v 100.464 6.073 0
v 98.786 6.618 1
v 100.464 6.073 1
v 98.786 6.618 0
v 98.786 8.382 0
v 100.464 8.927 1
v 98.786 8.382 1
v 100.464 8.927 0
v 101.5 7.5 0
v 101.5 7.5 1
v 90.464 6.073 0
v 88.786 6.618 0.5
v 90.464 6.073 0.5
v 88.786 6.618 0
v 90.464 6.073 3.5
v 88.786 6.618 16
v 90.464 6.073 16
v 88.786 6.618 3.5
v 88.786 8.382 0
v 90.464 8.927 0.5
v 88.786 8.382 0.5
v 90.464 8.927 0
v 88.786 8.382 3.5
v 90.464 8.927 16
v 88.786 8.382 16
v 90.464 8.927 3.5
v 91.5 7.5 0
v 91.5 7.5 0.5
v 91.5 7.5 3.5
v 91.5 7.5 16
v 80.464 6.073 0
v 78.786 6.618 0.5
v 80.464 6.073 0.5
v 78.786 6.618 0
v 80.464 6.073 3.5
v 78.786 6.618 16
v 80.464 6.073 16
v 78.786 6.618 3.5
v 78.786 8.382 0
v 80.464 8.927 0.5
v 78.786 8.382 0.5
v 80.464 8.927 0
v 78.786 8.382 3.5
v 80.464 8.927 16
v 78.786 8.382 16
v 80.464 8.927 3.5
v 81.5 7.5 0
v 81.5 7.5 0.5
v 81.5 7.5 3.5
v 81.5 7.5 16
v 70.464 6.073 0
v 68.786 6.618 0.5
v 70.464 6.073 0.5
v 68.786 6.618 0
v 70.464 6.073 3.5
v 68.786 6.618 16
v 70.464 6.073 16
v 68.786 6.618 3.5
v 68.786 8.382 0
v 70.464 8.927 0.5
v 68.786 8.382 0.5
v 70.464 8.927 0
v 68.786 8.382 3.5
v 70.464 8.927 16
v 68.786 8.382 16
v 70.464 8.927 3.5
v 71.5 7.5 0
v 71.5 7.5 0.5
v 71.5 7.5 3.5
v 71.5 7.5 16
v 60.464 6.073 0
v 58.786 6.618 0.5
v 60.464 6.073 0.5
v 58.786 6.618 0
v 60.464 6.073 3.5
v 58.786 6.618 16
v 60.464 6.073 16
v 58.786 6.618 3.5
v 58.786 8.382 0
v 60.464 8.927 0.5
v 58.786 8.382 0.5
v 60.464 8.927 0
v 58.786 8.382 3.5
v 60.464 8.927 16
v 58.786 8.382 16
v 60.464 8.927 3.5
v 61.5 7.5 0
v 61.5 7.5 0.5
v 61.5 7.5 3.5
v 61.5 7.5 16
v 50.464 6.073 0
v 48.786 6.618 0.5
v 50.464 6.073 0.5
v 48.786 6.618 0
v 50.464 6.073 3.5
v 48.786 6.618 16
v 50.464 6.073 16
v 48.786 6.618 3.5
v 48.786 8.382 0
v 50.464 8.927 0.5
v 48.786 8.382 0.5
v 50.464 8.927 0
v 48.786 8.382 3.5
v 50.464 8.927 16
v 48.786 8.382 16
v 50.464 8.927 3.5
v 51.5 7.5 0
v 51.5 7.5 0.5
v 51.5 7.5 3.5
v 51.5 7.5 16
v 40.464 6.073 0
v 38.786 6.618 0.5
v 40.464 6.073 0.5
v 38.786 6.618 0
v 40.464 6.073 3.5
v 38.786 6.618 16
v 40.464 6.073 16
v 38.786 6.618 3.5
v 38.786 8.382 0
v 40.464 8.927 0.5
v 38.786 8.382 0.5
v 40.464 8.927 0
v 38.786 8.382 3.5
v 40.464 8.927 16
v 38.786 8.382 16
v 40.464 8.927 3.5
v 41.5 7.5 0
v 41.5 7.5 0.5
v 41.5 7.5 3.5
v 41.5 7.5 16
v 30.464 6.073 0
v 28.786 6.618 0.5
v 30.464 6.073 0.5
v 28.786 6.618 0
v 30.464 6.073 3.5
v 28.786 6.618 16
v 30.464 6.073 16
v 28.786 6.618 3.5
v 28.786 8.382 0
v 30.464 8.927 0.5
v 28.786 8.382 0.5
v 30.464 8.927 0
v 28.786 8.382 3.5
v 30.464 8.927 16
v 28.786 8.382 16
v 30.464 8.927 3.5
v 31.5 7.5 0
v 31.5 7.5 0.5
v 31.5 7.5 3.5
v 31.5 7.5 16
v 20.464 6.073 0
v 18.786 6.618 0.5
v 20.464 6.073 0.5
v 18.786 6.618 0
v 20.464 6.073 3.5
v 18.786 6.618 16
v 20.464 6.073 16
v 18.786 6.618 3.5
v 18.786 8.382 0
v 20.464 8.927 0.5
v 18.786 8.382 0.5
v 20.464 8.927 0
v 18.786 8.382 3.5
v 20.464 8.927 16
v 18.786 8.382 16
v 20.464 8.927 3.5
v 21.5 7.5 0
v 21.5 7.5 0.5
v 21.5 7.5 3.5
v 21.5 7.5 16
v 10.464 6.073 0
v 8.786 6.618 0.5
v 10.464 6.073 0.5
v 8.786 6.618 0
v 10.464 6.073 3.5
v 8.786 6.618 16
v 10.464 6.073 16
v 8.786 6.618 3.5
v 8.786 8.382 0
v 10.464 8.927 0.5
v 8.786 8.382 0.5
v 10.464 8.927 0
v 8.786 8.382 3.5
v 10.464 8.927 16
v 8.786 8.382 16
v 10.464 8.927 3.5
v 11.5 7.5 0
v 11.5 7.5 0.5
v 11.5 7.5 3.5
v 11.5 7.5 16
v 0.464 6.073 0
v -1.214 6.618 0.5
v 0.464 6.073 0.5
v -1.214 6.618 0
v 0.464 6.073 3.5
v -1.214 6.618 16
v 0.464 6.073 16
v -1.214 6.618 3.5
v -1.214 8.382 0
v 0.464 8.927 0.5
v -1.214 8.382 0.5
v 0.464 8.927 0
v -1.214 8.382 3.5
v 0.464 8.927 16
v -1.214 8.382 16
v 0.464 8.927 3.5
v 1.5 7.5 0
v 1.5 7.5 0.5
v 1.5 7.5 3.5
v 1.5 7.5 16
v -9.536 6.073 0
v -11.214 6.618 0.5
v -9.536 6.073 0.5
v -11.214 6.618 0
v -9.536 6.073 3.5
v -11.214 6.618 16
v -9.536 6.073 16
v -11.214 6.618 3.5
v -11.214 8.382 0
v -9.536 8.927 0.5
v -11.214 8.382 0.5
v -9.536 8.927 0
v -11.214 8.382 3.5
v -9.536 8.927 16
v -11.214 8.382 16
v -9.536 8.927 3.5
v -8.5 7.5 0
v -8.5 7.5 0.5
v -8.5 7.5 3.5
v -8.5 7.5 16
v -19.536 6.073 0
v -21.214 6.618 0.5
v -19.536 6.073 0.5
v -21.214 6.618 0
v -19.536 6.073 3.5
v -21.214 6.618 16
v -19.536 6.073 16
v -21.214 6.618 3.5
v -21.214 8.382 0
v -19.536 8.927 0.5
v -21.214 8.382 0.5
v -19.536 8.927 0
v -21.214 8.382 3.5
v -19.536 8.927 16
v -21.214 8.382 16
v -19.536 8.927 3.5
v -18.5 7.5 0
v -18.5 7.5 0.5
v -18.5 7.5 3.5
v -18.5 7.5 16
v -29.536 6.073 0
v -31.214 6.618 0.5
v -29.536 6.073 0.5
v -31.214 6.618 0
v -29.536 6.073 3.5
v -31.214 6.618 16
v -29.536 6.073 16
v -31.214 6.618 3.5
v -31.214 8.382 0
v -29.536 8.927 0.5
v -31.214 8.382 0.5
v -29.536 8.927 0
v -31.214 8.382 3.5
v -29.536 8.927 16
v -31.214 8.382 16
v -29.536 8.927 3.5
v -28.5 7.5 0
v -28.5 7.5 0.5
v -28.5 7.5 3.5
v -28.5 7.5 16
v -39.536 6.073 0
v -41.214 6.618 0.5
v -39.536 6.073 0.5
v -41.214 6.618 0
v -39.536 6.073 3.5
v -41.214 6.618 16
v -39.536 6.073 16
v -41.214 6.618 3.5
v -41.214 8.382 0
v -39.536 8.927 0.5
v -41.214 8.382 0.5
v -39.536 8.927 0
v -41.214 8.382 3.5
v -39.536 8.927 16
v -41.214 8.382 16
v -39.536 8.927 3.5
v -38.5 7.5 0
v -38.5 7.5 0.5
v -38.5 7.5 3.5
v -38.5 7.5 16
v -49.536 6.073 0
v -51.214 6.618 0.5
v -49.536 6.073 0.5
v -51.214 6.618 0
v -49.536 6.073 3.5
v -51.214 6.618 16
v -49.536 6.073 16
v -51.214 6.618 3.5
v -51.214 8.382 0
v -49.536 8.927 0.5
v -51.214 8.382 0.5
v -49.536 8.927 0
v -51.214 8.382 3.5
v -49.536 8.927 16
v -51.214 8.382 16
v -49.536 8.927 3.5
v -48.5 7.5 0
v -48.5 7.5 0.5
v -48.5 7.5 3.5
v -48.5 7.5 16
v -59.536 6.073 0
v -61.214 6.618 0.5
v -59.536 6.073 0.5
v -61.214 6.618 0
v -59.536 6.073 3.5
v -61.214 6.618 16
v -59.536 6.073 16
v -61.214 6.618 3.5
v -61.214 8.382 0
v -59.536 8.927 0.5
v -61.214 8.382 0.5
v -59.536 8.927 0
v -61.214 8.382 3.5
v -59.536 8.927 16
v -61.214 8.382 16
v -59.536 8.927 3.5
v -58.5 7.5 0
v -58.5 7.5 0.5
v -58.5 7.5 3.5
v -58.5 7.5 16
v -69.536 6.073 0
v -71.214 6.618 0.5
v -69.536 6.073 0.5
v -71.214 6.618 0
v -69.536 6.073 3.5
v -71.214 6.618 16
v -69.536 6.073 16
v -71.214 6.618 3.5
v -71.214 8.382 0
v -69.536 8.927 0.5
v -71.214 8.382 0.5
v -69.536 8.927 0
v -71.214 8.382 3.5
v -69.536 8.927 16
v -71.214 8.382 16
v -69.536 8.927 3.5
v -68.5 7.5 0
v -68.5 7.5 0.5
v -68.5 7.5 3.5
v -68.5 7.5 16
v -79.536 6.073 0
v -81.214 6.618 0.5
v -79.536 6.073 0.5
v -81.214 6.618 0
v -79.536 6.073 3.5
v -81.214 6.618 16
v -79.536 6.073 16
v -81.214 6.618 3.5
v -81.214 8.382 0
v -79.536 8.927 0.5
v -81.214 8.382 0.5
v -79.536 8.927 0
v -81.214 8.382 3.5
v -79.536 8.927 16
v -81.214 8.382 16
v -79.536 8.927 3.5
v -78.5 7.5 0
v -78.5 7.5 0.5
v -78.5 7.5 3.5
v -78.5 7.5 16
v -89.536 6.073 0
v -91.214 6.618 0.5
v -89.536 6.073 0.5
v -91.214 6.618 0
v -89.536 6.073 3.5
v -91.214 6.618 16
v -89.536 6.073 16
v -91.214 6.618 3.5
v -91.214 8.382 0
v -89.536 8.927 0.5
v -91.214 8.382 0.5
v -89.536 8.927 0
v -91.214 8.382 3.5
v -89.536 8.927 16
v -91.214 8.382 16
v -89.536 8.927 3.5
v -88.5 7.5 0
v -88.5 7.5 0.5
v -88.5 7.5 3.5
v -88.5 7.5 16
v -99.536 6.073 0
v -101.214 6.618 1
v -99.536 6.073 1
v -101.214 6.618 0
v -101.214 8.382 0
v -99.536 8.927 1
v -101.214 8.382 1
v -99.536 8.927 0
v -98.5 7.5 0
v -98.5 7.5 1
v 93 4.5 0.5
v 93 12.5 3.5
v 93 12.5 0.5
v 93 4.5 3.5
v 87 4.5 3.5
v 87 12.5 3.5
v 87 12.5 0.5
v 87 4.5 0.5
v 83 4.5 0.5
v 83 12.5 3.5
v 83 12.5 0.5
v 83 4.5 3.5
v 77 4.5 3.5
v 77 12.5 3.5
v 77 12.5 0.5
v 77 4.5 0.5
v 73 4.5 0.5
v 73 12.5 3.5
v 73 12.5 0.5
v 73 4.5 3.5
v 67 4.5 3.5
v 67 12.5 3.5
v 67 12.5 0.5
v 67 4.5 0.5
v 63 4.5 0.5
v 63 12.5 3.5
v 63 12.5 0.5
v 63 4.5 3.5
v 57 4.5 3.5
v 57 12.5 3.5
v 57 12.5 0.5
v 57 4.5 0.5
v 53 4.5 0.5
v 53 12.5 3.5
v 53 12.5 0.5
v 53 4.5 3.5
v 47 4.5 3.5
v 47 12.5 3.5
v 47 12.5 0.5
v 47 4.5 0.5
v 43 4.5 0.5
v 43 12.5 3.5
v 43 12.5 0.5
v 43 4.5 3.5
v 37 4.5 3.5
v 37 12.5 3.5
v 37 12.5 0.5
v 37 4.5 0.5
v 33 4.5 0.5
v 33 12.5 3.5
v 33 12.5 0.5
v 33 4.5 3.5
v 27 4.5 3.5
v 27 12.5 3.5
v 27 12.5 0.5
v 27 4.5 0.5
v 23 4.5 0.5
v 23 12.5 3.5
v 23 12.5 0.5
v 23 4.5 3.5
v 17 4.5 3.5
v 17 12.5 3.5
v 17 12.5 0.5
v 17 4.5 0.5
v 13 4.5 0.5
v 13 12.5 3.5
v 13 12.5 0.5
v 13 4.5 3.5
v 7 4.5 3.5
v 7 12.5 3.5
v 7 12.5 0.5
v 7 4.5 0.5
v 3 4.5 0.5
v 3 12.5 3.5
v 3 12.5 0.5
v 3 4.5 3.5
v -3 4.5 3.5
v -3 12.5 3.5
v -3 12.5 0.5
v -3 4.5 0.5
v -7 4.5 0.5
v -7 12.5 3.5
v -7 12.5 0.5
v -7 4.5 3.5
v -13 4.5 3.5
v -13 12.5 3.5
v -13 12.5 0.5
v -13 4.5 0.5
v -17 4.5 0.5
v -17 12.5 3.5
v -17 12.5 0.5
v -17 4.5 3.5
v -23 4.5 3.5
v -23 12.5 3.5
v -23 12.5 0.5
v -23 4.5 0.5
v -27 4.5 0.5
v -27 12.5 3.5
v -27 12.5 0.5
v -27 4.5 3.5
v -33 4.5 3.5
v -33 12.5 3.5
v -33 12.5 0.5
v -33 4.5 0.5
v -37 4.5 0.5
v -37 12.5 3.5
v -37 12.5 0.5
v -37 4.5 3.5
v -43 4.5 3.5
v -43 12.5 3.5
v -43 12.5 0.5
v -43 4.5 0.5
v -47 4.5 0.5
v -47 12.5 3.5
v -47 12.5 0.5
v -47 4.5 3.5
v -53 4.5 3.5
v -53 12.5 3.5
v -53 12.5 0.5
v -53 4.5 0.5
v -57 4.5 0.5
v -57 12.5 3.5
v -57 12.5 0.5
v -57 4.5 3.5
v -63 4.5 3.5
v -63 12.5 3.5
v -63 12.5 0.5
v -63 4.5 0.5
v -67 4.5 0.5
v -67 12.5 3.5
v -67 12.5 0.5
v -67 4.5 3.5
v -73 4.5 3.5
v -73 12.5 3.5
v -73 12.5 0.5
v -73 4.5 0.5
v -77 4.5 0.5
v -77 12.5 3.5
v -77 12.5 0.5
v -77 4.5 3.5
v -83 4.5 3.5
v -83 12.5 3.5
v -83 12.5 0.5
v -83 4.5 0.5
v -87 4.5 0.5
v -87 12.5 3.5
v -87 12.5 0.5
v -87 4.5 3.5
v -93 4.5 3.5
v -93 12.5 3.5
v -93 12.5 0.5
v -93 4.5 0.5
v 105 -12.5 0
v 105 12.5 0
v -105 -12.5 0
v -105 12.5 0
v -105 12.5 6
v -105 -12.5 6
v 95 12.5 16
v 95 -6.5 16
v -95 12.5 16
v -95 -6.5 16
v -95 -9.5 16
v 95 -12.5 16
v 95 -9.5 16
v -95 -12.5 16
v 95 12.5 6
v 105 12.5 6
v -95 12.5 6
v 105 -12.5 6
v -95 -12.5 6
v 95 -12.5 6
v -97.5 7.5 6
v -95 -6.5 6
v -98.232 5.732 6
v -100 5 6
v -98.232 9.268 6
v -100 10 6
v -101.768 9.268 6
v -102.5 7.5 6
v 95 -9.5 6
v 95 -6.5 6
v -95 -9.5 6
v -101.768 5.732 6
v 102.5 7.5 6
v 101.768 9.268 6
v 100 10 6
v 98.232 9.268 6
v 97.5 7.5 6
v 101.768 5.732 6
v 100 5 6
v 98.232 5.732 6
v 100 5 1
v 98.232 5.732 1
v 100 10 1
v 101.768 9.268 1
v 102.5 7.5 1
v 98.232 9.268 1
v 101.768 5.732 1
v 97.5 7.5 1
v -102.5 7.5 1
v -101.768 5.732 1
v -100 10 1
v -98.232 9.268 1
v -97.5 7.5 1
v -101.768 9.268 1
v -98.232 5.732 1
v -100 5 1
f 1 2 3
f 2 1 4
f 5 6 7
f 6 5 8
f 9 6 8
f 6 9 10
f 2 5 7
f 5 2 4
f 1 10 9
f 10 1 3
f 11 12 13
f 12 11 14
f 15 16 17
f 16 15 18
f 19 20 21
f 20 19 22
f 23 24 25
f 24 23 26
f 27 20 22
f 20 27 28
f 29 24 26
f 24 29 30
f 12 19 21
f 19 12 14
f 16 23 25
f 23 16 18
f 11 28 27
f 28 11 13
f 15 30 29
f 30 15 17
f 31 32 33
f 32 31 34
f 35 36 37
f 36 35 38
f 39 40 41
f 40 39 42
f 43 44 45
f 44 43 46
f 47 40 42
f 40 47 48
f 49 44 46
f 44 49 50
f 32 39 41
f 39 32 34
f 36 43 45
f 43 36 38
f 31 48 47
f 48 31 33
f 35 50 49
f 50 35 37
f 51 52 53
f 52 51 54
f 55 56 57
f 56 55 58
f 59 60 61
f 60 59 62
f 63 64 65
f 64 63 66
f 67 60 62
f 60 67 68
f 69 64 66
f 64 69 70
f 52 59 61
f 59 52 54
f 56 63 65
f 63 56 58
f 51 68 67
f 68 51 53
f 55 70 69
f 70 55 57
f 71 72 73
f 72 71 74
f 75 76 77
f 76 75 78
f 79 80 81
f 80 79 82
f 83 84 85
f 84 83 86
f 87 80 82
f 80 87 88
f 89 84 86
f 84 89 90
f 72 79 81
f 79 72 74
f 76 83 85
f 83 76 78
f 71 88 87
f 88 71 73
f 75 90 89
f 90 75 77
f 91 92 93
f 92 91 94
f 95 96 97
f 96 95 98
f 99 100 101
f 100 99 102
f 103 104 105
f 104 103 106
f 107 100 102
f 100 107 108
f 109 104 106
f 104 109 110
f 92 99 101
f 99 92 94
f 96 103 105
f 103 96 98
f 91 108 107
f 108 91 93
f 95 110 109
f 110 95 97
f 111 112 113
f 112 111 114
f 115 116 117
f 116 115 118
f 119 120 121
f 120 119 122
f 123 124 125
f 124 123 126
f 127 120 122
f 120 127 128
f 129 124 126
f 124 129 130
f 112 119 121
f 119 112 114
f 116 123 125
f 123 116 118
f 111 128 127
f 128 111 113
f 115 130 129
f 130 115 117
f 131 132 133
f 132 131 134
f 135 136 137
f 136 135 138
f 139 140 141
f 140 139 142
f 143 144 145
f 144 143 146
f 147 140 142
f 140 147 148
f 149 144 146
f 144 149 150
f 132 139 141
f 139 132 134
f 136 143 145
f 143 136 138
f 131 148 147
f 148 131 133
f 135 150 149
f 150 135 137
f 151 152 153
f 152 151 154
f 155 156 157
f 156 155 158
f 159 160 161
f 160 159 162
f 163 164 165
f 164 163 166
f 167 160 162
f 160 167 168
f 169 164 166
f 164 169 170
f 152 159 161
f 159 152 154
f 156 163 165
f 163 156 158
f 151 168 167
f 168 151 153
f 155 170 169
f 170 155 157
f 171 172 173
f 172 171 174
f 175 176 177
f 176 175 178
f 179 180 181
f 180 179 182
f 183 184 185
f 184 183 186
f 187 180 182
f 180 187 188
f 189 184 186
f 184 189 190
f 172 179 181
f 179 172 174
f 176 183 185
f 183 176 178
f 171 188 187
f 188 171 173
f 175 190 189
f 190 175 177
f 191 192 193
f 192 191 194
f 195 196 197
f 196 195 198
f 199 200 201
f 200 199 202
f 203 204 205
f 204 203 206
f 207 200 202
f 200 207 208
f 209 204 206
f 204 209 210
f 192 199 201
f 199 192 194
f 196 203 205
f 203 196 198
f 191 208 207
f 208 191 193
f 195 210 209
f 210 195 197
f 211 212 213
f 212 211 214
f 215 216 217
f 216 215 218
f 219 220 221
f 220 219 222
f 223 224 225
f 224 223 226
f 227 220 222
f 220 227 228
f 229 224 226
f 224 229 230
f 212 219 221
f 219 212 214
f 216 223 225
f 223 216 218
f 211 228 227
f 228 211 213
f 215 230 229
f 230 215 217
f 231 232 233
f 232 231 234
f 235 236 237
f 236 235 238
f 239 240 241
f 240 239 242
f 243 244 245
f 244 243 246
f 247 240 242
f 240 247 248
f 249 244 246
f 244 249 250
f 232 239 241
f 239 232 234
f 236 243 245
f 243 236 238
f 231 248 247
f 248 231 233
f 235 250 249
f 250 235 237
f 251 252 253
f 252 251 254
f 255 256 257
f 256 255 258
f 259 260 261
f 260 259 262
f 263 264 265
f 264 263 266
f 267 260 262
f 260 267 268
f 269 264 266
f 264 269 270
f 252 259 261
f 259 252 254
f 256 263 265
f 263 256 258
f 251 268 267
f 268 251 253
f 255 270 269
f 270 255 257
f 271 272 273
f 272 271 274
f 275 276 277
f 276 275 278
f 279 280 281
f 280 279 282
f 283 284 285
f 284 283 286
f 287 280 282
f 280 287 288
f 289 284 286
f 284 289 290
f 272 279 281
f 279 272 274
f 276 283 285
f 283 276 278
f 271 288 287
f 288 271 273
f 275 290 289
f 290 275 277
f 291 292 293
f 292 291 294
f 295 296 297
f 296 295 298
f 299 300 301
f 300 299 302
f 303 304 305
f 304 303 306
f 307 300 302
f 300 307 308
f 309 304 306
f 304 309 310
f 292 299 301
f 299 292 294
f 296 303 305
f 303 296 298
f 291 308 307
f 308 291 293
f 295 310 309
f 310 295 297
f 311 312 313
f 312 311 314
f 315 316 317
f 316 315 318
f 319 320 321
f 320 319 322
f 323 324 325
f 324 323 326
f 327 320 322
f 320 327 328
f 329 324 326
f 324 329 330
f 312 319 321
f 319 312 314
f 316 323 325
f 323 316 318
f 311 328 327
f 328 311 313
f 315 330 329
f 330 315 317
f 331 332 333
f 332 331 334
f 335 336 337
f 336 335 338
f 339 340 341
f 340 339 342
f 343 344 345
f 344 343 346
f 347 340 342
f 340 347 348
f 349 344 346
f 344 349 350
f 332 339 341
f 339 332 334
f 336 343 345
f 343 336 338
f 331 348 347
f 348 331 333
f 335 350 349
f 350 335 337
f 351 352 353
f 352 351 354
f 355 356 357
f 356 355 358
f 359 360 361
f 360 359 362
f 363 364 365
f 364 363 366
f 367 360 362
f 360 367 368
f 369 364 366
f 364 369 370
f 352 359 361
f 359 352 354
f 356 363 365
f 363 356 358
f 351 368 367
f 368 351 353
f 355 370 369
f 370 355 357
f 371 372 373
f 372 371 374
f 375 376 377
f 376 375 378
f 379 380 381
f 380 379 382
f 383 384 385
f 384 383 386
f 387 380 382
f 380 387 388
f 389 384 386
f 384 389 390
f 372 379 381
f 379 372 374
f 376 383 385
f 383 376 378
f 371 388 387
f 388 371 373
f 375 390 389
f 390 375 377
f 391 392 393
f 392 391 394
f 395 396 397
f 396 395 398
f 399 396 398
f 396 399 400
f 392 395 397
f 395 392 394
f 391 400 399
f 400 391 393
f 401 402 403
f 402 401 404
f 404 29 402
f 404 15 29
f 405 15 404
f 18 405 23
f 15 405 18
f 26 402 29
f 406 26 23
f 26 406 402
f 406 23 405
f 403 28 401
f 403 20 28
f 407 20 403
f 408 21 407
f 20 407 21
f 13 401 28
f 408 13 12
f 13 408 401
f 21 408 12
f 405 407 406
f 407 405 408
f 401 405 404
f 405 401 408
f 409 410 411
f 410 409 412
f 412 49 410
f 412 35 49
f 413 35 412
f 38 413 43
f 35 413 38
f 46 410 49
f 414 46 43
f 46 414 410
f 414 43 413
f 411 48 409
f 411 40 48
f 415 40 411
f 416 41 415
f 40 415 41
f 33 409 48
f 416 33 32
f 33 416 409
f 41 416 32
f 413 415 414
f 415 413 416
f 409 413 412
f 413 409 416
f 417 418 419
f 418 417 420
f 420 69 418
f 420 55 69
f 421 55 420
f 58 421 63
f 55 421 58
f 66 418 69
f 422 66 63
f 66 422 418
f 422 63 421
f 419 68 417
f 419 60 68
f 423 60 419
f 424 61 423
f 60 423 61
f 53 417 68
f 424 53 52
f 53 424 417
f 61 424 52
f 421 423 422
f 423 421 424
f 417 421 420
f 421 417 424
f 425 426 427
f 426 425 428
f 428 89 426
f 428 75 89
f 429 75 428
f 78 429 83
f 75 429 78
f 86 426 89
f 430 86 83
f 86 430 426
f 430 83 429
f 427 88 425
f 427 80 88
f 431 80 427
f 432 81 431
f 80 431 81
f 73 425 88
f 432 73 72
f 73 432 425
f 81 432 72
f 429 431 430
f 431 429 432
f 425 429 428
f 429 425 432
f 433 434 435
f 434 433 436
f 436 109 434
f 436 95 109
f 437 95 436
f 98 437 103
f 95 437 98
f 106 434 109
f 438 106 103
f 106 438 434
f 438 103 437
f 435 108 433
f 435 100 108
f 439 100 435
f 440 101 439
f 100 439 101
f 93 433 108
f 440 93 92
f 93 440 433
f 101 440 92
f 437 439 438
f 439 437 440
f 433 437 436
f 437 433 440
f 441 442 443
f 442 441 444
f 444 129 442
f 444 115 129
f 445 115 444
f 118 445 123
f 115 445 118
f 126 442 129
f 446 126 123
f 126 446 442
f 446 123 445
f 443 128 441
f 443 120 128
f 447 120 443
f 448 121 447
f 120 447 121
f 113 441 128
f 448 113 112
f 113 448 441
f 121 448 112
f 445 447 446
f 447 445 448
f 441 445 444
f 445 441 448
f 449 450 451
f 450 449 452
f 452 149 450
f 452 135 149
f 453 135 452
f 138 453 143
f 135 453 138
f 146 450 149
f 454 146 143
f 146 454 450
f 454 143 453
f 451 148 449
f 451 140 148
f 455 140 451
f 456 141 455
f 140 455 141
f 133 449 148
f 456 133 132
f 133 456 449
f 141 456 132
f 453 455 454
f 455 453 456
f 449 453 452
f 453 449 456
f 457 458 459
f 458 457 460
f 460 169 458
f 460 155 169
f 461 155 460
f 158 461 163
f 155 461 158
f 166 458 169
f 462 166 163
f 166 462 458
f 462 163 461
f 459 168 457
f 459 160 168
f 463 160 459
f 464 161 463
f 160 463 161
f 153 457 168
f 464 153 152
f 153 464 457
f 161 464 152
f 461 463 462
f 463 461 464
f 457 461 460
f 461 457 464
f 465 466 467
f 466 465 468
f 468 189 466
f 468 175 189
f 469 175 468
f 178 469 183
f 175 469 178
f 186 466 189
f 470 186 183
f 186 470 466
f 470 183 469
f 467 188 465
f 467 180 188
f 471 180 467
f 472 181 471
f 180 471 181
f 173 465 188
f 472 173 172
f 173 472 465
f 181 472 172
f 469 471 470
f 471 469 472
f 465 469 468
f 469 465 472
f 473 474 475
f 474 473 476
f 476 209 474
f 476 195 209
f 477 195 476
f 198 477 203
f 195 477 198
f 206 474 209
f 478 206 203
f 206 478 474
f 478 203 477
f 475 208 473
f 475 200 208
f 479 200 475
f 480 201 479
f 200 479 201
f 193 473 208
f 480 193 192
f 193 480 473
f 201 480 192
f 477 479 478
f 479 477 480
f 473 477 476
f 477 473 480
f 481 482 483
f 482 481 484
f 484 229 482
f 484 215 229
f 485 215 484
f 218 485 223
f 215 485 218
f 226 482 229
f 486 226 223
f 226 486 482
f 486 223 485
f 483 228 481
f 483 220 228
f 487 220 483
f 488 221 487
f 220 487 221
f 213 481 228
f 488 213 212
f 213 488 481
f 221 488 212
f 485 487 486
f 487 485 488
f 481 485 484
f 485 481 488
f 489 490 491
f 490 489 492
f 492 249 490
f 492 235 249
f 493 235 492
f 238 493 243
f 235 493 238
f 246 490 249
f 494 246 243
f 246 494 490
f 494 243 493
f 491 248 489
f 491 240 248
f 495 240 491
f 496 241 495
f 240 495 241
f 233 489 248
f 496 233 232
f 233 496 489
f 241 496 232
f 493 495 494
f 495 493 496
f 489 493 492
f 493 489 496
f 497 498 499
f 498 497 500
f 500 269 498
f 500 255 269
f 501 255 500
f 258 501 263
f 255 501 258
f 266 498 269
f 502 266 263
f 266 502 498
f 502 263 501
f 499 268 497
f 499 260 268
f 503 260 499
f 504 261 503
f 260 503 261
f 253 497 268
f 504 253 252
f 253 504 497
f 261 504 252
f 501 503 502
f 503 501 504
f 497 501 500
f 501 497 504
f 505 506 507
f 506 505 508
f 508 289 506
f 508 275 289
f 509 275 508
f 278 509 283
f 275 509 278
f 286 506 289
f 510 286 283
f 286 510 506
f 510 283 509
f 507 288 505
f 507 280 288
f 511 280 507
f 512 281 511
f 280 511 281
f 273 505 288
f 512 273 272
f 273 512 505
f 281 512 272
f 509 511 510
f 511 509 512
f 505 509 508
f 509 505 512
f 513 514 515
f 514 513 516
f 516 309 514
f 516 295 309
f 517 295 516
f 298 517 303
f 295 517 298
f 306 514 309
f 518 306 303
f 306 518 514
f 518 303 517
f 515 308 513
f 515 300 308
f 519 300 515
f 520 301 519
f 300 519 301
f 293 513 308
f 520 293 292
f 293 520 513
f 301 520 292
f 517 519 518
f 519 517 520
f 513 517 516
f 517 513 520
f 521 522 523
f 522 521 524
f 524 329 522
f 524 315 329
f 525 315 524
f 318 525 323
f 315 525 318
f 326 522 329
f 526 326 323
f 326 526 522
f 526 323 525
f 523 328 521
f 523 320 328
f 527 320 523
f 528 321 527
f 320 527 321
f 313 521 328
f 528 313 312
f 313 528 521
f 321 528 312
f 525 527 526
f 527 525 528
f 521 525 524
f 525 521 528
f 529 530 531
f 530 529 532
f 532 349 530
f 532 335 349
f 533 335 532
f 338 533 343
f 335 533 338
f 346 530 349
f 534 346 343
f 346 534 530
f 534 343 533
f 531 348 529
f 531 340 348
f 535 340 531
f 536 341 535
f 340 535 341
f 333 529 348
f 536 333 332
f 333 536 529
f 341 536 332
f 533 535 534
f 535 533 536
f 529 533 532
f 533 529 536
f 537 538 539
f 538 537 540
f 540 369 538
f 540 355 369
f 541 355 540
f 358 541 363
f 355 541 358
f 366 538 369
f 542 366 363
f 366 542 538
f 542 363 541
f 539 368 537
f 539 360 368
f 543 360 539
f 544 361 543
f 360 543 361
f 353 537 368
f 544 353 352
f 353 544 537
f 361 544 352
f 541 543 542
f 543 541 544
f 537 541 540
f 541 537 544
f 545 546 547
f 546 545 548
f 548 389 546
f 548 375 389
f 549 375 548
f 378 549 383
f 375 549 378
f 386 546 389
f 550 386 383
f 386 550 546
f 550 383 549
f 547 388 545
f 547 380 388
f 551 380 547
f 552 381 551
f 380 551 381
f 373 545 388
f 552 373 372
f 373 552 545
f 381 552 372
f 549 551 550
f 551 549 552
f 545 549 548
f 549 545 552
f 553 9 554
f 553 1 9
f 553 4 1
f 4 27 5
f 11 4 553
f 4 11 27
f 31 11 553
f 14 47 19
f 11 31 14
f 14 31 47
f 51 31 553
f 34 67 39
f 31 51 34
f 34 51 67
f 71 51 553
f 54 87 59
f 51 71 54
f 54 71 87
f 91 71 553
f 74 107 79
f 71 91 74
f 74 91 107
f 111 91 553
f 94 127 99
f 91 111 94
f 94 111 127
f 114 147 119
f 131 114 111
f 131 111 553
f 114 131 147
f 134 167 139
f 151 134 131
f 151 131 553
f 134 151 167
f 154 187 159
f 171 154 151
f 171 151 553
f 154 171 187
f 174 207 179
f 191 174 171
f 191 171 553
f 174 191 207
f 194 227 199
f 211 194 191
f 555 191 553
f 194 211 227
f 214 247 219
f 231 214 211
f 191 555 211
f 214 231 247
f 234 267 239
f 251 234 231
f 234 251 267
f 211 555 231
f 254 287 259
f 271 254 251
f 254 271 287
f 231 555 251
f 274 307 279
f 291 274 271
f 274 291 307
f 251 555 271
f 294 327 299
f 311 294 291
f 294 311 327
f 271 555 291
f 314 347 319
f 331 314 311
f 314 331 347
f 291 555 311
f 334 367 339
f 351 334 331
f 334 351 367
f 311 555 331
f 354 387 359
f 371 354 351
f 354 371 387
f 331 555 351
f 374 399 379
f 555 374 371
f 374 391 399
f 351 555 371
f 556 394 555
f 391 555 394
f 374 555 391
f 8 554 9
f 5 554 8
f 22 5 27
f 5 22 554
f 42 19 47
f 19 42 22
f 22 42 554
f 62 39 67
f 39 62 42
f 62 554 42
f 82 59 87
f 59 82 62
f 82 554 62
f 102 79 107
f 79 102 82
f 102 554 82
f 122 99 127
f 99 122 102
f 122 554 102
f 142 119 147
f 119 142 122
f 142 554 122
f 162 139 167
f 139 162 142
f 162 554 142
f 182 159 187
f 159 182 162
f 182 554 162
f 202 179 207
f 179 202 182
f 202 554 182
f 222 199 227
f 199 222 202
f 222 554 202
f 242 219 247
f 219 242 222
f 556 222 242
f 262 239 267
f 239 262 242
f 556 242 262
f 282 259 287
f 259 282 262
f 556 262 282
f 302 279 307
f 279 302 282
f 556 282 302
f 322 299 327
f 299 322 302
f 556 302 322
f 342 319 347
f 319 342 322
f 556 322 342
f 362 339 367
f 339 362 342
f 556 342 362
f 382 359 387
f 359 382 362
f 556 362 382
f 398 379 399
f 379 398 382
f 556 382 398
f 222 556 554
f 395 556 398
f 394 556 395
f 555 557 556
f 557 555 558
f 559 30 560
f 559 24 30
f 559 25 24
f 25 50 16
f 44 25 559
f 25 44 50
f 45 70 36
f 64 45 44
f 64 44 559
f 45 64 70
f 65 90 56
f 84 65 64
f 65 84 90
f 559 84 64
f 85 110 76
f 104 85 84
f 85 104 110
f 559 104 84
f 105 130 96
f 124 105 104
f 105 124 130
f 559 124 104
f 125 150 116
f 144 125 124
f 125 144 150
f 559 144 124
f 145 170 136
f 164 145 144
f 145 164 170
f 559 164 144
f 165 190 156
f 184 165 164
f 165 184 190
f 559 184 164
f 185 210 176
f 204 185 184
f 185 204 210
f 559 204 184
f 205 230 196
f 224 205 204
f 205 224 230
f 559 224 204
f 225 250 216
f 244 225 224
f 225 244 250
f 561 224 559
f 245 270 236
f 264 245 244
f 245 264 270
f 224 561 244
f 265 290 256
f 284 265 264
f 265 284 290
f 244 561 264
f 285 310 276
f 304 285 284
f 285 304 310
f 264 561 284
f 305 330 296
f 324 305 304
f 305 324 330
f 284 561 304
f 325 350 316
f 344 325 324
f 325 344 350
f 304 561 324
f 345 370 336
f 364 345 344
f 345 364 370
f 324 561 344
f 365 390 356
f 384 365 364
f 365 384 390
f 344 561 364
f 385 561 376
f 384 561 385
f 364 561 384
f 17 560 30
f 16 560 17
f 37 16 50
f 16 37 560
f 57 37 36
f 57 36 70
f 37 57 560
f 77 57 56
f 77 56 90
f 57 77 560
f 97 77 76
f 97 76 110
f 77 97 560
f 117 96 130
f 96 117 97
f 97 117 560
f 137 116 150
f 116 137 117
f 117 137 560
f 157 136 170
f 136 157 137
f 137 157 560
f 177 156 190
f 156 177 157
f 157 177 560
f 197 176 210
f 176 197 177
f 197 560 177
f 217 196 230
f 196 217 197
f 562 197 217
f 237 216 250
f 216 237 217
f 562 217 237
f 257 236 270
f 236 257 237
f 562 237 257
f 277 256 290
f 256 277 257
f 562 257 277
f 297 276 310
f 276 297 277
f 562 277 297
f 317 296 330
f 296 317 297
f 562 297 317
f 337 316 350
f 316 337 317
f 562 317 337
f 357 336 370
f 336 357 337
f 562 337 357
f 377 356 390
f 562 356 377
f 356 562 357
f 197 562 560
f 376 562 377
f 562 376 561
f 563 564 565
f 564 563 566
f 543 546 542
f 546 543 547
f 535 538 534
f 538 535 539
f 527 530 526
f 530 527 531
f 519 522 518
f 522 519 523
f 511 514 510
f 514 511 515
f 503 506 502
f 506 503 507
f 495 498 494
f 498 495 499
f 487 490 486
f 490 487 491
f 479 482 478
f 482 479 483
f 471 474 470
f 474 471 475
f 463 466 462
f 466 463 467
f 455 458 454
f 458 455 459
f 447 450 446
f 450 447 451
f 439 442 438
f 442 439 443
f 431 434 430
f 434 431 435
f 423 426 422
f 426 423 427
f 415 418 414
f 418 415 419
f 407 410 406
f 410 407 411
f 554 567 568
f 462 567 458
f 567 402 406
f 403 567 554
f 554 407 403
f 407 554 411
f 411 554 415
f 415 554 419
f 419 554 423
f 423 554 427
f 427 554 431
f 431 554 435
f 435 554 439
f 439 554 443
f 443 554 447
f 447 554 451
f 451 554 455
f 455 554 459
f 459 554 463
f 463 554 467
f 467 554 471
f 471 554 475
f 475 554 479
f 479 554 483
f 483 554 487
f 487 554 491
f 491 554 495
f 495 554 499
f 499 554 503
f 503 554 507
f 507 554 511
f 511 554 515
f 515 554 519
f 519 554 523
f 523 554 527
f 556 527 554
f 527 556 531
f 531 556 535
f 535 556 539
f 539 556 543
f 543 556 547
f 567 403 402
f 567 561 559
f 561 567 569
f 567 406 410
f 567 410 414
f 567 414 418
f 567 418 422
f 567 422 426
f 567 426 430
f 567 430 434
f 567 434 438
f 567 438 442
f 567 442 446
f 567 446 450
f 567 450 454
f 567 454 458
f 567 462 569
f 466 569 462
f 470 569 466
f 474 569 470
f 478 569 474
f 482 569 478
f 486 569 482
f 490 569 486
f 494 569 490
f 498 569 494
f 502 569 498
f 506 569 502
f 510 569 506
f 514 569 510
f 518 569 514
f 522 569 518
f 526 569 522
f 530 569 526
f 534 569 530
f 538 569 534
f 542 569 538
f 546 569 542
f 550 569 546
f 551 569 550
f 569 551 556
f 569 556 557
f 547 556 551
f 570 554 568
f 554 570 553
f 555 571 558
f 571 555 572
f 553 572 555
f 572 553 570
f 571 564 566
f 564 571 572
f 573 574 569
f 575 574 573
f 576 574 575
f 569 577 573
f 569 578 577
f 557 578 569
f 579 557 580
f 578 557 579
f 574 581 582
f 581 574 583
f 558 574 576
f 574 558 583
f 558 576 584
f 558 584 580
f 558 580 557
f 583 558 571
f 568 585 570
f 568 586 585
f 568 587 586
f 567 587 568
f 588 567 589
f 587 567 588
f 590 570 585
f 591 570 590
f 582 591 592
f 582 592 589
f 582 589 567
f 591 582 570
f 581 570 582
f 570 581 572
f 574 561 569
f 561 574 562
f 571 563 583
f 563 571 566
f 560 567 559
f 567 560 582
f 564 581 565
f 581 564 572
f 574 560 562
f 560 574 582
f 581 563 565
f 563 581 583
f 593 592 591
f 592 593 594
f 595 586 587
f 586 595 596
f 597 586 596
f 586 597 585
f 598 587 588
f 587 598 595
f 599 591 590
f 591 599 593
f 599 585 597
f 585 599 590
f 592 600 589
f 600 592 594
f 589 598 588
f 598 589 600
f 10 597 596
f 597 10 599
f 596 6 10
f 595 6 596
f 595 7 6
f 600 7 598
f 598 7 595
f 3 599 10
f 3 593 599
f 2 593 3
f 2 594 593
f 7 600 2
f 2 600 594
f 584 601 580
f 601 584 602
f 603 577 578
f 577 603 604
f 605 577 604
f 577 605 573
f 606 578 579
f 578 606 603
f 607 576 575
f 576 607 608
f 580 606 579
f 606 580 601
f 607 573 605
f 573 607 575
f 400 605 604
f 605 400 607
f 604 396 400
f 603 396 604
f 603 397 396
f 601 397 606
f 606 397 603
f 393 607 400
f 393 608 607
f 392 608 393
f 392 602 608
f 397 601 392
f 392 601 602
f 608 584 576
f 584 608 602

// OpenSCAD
vzdalenost_der = 10; //rozteč děr mezi sebou
pocet_der = 20; //pocet ter pres ktere je lista ponížené o 1

//rozměry výrezu
//rozmer v ose y
vzdalenost_od_okraje = 20; //vzdalenost stredu upevnovaci diry od kraje desky
vzdalenost_od_diry = 5; //vzdalenost od stredu upevnovaci diry na druhou stranu

//rozmery vyrezu v ose x
vzdalenost_1 = 5; //od díry ke kraji
vzdalenost_2 = 5;

//definicce celkové výšky lišty
zapust=6; //závislé na sloupku
vyska_listy=10;

//parametry pro úžlabinu
tlouska_celicka = 3; //definuje uzlabinu
sirka_materialu = 3; //sirka materialu od kraje desky k uzlabine

//parametry šroubu
vyska_hlavy = 5;
prumer_hlavy=5;
prumer_sroubu=3;

//parametry matice
prumer_matice=6; //hrany k hraně
vyska_matice=3;  //vyska matice
posuv_dorazu=0;  //pro moznost posuvu dorazu pro vsunutí matice
matice_sila_materialu=2; //sila materialu pod maticí na ose z

difference () {
color("cyan")
    translate([0, 0, 0])
        linear_extrude(height = zapust+vyska_listy)
            square([((pocet_der*vzdalenost_der)+2*vzdalenost_1), vzdalenost_od_okraje+vzdalenost_od_diry], center = true); 
    
    translate([-((((pocet_der*vzdalenost_der)+2*vzdalenost_1)/2)-(vzdalenost_1+vzdalenost_2/2)), 0, (zapust)])
        linear_extrude(height = vyska_listy)
            square([vzdalenost_2, vzdalenost_od_okraje+vzdalenost_od_diry], center = true); 
    
    translate([((((pocet_der*vzdalenost_der)+2*vzdalenost_1)/2)-(vzdalenost_1+vzdalenost_2/2)), 0, (zapust)])
        linear_extrude(height = vyska_listy)
            square([vzdalenost_2, vzdalenost_od_okraje+vzdalenost_od_diry], center = true); 
    
    translate([-((((pocet_der*vzdalenost_der)+2*vzdalenost_1)/2)-(vzdalenost_1/2)), 0, (zapust)])
        linear_extrude(height = vyska_listy)
            square([vzdalenost_1, vzdalenost_od_okraje+vzdalenost_od_diry], center = true); 
    
    translate([((((pocet_der*vzdalenost_der)+2*vzdalenost_1)/2)-(vzdalenost_1/2)), 0, (zapust)])
        linear_extrude(height = vyska_listy)
            square([vzdalenost_1, vzdalenost_od_okraje+vzdalenost_od_diry], center = true); 
    
     translate([0,-((((vzdalenost_od_okraje+vzdalenost_od_diry)/2)-sirka_materialu)-(tlouska_celicka/2)), zapust])
        linear_extrude(height = vyska_listy)
            square([((pocet_der*vzdalenost_der)+2*vzdalenost_1), tlouska_celicka], center = true); 
   
    
    //otvory pro hlavy sroubu
    
    translate([vzdalenost_der*pocet_der/2,-(((vzdalenost_od_okraje+vzdalenost_od_diry)/2)-vzdalenost_od_okraje),(zapust-vyska_hlavy)+vyska_hlavy/2])  // center top screw
        cylinder(vyska_hlavy, d=prumer_hlavy, center=true);
        
     translate([-vzdalenost_der*pocet_der/2,-(((vzdalenost_od_okraje+vzdalenost_od_diry)/2)-vzdalenost_od_okraje),(zapust-vyska_hlavy)+vyska_hlavy/2])  // center top screw
        cylinder(vyska_hlavy, d=prumer_hlavy, center=true);
 
//otvory pro srouby

 for (i = [0:1:pocet_der]) {      
 translate([(-i*vzdalenost_der)+vzdalenost_der*pocet_der/2,-(((vzdalenost_od_okraje+vzdalenost_od_diry)/2)-vzdalenost_od_okraje),(zapust-vyska_hlavy)+vyska_hlavy/2])  // center top screw
        cylinder((2*(zapust+vyska_listy)), d=prumer_sroubu, center=true); 
      }
//otvory pro matice
     
 for (i = [1:1:(pocet_der-1)]) {      
 translate([(-i*vzdalenost_der)+vzdalenost_der*pocet_der/2,-((((vzdalenost_od_okraje+vzdalenost_od_diry)/2)-vzdalenost_od_okraje)-((((prumer_matice+posuv_dorazu+vzdalenost_od_diry)/2))-(prumer_matice+posuv_dorazu)/2)),matice_sila_materialu])  // center top screw
      cube([prumer_matice, prumer_matice+posuv_dorazu+vzdalenost_od_diry,vyska_matice], center = true);
  
     }       
        
        
        
         }
         
       
